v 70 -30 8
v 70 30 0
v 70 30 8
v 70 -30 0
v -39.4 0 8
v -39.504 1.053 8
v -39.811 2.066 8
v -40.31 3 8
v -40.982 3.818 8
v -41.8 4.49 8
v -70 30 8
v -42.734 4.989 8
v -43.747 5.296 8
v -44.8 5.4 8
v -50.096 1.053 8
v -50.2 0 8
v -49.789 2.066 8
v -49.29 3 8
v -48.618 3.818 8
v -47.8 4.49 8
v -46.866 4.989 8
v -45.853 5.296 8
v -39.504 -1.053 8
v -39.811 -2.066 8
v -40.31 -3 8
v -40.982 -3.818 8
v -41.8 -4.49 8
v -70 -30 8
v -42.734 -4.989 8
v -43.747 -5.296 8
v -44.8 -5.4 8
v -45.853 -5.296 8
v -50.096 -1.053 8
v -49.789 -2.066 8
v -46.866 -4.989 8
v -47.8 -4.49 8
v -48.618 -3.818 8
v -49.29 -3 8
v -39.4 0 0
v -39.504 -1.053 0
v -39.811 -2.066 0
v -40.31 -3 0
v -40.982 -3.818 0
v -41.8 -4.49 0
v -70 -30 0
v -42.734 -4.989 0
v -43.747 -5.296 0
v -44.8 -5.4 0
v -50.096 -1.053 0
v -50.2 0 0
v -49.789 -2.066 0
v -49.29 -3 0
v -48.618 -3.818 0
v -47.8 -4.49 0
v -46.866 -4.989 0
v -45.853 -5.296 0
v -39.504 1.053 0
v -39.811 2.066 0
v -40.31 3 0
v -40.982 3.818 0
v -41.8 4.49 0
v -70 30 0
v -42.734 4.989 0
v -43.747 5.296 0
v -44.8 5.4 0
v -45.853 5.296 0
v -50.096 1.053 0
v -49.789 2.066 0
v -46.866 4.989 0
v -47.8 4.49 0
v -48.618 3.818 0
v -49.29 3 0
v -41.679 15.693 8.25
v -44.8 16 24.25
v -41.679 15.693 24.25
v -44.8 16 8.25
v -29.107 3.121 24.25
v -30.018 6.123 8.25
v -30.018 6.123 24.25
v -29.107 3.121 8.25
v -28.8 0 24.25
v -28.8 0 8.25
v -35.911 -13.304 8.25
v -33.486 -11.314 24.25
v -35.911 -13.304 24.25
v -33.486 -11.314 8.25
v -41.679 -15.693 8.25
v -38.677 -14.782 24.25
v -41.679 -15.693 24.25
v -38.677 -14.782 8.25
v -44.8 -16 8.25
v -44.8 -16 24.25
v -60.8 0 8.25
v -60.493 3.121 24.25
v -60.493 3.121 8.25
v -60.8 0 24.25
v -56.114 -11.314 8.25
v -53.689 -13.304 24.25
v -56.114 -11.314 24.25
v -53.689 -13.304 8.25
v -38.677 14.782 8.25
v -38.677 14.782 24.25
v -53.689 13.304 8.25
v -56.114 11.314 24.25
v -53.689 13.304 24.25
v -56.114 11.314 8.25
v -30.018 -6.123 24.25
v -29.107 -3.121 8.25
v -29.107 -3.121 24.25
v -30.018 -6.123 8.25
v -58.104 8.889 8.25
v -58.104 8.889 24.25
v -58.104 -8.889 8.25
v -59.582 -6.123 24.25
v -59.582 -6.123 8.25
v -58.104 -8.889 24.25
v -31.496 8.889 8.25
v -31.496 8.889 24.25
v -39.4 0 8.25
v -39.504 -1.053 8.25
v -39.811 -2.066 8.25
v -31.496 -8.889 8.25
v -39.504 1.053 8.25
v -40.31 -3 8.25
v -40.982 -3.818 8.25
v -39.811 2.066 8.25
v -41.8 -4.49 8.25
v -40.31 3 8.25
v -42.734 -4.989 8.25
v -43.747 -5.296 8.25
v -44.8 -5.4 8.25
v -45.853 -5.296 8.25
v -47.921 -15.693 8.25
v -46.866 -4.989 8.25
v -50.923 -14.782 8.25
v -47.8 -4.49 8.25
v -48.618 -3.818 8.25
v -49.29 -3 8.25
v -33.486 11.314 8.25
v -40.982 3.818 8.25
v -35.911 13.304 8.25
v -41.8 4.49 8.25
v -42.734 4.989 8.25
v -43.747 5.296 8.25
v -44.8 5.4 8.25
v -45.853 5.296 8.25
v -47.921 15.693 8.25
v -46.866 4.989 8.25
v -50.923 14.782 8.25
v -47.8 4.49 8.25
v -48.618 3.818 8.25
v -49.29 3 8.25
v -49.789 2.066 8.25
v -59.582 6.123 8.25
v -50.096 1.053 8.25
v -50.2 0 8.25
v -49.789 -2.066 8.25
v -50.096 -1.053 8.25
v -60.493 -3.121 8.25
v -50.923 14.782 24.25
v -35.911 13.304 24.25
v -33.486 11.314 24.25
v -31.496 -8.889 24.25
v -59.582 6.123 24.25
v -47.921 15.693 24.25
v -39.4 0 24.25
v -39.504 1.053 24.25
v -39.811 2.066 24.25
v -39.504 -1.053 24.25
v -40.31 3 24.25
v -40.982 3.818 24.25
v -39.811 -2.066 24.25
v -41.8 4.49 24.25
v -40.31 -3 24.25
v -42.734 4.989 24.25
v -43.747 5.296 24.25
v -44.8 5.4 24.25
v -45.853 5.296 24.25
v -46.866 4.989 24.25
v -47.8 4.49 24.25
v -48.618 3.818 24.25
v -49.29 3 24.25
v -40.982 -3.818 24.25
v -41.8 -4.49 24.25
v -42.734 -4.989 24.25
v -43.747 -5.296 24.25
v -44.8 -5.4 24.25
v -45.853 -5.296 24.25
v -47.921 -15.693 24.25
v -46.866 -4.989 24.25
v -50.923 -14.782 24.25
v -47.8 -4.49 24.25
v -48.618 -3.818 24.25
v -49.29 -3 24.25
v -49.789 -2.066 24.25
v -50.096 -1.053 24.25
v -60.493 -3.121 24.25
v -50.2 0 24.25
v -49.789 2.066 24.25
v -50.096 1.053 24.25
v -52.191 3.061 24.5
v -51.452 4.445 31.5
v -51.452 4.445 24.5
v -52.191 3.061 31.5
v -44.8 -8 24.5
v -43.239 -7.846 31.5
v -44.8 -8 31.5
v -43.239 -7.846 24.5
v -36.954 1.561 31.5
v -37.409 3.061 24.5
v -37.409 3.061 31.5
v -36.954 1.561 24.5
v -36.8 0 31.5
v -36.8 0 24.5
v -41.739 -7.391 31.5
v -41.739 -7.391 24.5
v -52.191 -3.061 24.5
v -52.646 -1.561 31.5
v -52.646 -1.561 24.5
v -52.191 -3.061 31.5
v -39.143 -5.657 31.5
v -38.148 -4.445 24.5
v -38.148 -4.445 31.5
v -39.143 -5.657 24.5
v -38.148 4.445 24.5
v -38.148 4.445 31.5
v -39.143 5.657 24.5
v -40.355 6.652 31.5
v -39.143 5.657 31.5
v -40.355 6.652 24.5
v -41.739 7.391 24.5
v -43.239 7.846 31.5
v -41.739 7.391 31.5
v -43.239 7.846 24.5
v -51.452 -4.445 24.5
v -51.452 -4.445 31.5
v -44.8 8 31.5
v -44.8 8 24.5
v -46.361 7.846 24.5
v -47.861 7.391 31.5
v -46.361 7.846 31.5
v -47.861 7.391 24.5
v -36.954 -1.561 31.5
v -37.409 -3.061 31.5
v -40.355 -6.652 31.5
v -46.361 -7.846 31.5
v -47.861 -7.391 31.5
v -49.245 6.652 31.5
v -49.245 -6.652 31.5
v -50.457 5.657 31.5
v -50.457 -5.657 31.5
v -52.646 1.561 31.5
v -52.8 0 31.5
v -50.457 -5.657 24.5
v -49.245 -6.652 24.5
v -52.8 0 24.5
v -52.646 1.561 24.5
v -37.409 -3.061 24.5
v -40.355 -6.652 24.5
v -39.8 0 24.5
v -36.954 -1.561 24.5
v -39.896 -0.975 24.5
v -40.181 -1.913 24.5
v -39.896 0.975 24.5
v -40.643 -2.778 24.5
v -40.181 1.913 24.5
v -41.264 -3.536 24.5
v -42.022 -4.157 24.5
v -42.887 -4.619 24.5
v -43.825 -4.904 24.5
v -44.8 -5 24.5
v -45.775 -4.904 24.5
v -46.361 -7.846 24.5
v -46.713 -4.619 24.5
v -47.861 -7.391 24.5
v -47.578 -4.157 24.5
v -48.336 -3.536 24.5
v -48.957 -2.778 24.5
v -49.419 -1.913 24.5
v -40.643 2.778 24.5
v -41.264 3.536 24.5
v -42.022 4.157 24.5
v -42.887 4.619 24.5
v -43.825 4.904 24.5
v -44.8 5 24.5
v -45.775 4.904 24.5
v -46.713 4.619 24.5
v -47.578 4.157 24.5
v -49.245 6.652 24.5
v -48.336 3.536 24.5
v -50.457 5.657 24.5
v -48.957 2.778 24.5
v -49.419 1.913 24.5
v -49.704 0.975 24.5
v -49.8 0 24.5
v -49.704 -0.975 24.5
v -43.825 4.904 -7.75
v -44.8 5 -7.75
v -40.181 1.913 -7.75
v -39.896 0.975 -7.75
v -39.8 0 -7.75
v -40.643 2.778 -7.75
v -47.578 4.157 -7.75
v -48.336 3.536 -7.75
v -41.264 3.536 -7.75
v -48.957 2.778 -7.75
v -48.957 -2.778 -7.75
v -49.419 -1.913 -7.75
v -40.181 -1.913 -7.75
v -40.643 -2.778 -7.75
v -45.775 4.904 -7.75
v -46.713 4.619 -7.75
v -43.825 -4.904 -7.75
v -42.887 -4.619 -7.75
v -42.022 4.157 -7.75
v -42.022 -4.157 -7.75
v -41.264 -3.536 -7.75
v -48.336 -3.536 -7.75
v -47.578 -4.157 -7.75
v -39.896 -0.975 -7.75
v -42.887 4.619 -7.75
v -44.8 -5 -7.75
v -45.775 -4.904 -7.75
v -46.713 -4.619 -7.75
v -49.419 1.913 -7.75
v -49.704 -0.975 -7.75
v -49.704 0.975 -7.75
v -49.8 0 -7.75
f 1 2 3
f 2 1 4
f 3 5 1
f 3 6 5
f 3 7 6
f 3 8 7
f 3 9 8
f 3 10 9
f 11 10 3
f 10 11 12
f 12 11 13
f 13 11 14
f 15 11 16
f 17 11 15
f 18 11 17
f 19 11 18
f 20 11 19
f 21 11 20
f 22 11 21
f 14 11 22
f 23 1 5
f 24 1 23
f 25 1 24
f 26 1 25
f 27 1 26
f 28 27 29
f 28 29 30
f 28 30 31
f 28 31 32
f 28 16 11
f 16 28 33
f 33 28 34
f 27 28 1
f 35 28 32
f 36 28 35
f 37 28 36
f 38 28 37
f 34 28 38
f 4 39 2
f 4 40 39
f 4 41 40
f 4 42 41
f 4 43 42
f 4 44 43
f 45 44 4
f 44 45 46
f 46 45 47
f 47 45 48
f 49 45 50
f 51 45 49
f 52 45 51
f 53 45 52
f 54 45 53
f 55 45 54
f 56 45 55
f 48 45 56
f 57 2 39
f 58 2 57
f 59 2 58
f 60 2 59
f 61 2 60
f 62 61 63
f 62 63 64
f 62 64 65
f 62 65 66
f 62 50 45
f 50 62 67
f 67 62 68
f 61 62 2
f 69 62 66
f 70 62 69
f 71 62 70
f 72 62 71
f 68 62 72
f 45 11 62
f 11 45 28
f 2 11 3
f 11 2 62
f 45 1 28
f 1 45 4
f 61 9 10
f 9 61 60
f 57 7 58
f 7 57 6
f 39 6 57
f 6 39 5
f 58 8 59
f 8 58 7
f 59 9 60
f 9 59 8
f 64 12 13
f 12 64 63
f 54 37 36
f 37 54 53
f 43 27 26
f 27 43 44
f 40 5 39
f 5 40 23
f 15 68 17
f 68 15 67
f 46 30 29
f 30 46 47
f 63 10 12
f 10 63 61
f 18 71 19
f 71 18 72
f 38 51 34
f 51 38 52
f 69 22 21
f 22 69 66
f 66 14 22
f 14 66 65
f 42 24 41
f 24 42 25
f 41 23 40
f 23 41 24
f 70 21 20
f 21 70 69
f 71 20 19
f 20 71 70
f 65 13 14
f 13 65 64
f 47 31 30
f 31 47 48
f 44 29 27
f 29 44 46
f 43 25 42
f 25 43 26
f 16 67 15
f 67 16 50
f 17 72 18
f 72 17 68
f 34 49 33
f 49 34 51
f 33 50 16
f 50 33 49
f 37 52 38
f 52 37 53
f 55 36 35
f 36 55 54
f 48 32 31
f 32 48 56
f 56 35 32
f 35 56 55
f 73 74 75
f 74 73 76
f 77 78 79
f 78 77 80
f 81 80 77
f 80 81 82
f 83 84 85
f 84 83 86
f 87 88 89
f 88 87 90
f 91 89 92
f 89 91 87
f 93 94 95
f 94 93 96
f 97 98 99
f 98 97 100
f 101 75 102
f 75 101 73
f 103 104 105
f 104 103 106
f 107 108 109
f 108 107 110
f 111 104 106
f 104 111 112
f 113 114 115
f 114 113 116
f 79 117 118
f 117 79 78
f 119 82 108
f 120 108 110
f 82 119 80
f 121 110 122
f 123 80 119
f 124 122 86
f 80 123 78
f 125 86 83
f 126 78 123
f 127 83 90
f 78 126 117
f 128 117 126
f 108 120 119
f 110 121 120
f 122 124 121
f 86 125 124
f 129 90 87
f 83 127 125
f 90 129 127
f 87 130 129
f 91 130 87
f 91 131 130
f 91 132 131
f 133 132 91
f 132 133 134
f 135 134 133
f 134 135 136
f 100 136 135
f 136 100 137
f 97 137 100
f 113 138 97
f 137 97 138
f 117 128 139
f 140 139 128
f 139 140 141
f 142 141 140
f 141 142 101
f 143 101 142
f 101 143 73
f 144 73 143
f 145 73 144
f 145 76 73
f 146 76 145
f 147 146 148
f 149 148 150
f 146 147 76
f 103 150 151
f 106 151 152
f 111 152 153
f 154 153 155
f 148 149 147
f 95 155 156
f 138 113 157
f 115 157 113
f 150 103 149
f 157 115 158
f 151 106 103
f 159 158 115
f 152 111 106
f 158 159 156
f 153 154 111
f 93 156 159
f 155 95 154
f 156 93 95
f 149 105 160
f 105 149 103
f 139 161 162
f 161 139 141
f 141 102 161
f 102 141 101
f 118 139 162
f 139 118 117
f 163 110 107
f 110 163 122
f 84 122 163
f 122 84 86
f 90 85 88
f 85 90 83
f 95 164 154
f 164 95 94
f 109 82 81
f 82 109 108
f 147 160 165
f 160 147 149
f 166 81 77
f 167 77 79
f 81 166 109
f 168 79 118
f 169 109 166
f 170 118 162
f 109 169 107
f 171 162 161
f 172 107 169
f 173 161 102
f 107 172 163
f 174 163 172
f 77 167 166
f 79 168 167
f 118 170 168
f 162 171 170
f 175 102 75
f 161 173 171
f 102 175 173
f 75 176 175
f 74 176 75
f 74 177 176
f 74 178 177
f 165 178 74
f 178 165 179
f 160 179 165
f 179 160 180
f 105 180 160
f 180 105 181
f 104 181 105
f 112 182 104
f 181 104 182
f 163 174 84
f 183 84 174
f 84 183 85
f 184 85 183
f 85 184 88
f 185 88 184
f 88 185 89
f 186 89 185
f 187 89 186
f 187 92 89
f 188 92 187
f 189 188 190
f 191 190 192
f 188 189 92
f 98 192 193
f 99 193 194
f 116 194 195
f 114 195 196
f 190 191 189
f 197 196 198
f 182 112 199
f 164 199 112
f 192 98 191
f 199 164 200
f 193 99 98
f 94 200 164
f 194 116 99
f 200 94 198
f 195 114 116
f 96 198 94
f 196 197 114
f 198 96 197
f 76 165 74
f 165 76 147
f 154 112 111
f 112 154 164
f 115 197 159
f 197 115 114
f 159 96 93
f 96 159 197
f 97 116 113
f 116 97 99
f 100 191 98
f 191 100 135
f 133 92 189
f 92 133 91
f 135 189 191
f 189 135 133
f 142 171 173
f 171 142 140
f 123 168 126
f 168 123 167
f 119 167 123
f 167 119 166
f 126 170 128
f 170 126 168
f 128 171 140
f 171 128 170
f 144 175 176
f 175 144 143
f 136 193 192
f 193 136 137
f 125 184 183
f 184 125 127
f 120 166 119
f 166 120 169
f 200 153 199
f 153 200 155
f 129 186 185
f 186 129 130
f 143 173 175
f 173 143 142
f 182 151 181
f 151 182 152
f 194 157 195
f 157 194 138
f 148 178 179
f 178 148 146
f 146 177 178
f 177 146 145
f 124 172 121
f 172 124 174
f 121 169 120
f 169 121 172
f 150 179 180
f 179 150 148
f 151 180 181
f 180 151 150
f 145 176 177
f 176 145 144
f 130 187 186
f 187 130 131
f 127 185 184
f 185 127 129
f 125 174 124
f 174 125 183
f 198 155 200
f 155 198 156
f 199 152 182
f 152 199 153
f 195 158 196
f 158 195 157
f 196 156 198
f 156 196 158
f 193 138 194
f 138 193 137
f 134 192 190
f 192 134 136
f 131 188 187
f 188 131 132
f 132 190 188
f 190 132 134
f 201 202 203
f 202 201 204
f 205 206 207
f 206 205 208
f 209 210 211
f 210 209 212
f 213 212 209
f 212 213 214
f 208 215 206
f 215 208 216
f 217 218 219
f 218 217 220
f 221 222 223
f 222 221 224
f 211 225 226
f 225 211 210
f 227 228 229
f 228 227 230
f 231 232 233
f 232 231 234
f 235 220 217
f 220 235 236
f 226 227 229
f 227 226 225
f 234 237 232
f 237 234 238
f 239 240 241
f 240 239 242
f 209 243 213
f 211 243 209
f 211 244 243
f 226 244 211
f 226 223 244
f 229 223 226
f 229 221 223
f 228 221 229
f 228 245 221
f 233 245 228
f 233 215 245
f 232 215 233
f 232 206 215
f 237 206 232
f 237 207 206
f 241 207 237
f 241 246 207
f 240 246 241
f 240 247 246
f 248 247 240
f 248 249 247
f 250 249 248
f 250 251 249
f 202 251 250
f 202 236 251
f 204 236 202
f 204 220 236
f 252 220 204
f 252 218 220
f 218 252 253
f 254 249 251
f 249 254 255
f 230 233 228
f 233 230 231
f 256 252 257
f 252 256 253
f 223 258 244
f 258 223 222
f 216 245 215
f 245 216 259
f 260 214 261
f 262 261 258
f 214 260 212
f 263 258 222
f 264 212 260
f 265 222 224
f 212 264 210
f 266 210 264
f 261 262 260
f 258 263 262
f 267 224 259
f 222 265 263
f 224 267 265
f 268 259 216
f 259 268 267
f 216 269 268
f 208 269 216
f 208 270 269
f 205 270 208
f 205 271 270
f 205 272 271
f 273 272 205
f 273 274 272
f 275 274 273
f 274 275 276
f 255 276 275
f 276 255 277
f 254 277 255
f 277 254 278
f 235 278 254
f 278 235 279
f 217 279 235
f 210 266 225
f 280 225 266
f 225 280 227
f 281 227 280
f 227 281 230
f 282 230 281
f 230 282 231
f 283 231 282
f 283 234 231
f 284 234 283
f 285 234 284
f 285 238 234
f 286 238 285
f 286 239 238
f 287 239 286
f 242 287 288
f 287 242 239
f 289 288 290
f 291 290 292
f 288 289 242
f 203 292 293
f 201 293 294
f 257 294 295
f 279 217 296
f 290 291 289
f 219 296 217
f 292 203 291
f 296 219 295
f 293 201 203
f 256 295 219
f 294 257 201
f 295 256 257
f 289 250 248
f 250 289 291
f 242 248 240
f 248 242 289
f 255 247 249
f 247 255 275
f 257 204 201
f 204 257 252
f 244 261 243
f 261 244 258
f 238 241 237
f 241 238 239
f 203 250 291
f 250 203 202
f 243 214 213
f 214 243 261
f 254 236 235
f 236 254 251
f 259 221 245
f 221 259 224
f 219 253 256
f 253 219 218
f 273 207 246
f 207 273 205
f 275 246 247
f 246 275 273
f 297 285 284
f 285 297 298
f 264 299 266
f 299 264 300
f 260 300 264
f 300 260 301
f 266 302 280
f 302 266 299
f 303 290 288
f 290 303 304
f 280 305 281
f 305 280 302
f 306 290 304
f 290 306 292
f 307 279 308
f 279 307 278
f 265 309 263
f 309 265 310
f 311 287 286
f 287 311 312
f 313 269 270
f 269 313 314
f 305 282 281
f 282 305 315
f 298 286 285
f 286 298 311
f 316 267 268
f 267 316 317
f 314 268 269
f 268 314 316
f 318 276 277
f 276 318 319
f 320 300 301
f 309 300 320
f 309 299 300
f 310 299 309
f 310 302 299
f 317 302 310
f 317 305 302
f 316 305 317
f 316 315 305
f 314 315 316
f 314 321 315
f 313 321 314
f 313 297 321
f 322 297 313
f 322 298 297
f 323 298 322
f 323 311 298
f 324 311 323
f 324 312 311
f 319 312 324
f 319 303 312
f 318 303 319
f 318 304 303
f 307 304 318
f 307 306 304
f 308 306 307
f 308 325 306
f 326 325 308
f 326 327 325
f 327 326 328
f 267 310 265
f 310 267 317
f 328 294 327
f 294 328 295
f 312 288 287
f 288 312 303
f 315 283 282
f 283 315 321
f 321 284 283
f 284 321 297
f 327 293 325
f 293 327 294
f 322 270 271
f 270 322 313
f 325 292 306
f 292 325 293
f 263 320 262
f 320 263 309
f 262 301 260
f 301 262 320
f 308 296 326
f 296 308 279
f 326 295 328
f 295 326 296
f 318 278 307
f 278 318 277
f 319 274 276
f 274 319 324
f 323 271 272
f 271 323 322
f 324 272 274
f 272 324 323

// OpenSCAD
$fn = 32;

// ------------------------------------------------------------------------
// Standoff columns: 1 d32 standoffs, bolts d10
// Every part is its own module, assembly() places them once.
// ------------------------------------------------------------------------

// --- part 1 ---
module base_plate() {
  difference() {
    translate([-70, -30, 0]) cube([140, 60, 8]);
    translate([-44.8, 0, -1]) cylinder(h = 10, d = 10.8);
  }
}

// --- part 2 ---
module spacer() {
  difference() {
      translate([0, 0, 0]) cylinder(h = 16, d = 32);
      translate([0, 0, -1]) cylinder(h = 18, d = 10.8);
    }
}

// --- part 3 ---
module bolt() {
  cylinder(h = 7, d = 16);
  translate([0, 0, -32.25]) cylinder(h = 32.25, d = 10);
}

// --- assembly ---
module assembly() {
  translate([0, 0, 0]) rotate([0, 0, 0]) base_plate();
  translate([-44.8, 0, 8.25]) rotate([0, 0, 0]) spacer();
  translate([-44.8, 0, 24.5]) rotate([0, 0, 0]) bolt();
}

assembly();
